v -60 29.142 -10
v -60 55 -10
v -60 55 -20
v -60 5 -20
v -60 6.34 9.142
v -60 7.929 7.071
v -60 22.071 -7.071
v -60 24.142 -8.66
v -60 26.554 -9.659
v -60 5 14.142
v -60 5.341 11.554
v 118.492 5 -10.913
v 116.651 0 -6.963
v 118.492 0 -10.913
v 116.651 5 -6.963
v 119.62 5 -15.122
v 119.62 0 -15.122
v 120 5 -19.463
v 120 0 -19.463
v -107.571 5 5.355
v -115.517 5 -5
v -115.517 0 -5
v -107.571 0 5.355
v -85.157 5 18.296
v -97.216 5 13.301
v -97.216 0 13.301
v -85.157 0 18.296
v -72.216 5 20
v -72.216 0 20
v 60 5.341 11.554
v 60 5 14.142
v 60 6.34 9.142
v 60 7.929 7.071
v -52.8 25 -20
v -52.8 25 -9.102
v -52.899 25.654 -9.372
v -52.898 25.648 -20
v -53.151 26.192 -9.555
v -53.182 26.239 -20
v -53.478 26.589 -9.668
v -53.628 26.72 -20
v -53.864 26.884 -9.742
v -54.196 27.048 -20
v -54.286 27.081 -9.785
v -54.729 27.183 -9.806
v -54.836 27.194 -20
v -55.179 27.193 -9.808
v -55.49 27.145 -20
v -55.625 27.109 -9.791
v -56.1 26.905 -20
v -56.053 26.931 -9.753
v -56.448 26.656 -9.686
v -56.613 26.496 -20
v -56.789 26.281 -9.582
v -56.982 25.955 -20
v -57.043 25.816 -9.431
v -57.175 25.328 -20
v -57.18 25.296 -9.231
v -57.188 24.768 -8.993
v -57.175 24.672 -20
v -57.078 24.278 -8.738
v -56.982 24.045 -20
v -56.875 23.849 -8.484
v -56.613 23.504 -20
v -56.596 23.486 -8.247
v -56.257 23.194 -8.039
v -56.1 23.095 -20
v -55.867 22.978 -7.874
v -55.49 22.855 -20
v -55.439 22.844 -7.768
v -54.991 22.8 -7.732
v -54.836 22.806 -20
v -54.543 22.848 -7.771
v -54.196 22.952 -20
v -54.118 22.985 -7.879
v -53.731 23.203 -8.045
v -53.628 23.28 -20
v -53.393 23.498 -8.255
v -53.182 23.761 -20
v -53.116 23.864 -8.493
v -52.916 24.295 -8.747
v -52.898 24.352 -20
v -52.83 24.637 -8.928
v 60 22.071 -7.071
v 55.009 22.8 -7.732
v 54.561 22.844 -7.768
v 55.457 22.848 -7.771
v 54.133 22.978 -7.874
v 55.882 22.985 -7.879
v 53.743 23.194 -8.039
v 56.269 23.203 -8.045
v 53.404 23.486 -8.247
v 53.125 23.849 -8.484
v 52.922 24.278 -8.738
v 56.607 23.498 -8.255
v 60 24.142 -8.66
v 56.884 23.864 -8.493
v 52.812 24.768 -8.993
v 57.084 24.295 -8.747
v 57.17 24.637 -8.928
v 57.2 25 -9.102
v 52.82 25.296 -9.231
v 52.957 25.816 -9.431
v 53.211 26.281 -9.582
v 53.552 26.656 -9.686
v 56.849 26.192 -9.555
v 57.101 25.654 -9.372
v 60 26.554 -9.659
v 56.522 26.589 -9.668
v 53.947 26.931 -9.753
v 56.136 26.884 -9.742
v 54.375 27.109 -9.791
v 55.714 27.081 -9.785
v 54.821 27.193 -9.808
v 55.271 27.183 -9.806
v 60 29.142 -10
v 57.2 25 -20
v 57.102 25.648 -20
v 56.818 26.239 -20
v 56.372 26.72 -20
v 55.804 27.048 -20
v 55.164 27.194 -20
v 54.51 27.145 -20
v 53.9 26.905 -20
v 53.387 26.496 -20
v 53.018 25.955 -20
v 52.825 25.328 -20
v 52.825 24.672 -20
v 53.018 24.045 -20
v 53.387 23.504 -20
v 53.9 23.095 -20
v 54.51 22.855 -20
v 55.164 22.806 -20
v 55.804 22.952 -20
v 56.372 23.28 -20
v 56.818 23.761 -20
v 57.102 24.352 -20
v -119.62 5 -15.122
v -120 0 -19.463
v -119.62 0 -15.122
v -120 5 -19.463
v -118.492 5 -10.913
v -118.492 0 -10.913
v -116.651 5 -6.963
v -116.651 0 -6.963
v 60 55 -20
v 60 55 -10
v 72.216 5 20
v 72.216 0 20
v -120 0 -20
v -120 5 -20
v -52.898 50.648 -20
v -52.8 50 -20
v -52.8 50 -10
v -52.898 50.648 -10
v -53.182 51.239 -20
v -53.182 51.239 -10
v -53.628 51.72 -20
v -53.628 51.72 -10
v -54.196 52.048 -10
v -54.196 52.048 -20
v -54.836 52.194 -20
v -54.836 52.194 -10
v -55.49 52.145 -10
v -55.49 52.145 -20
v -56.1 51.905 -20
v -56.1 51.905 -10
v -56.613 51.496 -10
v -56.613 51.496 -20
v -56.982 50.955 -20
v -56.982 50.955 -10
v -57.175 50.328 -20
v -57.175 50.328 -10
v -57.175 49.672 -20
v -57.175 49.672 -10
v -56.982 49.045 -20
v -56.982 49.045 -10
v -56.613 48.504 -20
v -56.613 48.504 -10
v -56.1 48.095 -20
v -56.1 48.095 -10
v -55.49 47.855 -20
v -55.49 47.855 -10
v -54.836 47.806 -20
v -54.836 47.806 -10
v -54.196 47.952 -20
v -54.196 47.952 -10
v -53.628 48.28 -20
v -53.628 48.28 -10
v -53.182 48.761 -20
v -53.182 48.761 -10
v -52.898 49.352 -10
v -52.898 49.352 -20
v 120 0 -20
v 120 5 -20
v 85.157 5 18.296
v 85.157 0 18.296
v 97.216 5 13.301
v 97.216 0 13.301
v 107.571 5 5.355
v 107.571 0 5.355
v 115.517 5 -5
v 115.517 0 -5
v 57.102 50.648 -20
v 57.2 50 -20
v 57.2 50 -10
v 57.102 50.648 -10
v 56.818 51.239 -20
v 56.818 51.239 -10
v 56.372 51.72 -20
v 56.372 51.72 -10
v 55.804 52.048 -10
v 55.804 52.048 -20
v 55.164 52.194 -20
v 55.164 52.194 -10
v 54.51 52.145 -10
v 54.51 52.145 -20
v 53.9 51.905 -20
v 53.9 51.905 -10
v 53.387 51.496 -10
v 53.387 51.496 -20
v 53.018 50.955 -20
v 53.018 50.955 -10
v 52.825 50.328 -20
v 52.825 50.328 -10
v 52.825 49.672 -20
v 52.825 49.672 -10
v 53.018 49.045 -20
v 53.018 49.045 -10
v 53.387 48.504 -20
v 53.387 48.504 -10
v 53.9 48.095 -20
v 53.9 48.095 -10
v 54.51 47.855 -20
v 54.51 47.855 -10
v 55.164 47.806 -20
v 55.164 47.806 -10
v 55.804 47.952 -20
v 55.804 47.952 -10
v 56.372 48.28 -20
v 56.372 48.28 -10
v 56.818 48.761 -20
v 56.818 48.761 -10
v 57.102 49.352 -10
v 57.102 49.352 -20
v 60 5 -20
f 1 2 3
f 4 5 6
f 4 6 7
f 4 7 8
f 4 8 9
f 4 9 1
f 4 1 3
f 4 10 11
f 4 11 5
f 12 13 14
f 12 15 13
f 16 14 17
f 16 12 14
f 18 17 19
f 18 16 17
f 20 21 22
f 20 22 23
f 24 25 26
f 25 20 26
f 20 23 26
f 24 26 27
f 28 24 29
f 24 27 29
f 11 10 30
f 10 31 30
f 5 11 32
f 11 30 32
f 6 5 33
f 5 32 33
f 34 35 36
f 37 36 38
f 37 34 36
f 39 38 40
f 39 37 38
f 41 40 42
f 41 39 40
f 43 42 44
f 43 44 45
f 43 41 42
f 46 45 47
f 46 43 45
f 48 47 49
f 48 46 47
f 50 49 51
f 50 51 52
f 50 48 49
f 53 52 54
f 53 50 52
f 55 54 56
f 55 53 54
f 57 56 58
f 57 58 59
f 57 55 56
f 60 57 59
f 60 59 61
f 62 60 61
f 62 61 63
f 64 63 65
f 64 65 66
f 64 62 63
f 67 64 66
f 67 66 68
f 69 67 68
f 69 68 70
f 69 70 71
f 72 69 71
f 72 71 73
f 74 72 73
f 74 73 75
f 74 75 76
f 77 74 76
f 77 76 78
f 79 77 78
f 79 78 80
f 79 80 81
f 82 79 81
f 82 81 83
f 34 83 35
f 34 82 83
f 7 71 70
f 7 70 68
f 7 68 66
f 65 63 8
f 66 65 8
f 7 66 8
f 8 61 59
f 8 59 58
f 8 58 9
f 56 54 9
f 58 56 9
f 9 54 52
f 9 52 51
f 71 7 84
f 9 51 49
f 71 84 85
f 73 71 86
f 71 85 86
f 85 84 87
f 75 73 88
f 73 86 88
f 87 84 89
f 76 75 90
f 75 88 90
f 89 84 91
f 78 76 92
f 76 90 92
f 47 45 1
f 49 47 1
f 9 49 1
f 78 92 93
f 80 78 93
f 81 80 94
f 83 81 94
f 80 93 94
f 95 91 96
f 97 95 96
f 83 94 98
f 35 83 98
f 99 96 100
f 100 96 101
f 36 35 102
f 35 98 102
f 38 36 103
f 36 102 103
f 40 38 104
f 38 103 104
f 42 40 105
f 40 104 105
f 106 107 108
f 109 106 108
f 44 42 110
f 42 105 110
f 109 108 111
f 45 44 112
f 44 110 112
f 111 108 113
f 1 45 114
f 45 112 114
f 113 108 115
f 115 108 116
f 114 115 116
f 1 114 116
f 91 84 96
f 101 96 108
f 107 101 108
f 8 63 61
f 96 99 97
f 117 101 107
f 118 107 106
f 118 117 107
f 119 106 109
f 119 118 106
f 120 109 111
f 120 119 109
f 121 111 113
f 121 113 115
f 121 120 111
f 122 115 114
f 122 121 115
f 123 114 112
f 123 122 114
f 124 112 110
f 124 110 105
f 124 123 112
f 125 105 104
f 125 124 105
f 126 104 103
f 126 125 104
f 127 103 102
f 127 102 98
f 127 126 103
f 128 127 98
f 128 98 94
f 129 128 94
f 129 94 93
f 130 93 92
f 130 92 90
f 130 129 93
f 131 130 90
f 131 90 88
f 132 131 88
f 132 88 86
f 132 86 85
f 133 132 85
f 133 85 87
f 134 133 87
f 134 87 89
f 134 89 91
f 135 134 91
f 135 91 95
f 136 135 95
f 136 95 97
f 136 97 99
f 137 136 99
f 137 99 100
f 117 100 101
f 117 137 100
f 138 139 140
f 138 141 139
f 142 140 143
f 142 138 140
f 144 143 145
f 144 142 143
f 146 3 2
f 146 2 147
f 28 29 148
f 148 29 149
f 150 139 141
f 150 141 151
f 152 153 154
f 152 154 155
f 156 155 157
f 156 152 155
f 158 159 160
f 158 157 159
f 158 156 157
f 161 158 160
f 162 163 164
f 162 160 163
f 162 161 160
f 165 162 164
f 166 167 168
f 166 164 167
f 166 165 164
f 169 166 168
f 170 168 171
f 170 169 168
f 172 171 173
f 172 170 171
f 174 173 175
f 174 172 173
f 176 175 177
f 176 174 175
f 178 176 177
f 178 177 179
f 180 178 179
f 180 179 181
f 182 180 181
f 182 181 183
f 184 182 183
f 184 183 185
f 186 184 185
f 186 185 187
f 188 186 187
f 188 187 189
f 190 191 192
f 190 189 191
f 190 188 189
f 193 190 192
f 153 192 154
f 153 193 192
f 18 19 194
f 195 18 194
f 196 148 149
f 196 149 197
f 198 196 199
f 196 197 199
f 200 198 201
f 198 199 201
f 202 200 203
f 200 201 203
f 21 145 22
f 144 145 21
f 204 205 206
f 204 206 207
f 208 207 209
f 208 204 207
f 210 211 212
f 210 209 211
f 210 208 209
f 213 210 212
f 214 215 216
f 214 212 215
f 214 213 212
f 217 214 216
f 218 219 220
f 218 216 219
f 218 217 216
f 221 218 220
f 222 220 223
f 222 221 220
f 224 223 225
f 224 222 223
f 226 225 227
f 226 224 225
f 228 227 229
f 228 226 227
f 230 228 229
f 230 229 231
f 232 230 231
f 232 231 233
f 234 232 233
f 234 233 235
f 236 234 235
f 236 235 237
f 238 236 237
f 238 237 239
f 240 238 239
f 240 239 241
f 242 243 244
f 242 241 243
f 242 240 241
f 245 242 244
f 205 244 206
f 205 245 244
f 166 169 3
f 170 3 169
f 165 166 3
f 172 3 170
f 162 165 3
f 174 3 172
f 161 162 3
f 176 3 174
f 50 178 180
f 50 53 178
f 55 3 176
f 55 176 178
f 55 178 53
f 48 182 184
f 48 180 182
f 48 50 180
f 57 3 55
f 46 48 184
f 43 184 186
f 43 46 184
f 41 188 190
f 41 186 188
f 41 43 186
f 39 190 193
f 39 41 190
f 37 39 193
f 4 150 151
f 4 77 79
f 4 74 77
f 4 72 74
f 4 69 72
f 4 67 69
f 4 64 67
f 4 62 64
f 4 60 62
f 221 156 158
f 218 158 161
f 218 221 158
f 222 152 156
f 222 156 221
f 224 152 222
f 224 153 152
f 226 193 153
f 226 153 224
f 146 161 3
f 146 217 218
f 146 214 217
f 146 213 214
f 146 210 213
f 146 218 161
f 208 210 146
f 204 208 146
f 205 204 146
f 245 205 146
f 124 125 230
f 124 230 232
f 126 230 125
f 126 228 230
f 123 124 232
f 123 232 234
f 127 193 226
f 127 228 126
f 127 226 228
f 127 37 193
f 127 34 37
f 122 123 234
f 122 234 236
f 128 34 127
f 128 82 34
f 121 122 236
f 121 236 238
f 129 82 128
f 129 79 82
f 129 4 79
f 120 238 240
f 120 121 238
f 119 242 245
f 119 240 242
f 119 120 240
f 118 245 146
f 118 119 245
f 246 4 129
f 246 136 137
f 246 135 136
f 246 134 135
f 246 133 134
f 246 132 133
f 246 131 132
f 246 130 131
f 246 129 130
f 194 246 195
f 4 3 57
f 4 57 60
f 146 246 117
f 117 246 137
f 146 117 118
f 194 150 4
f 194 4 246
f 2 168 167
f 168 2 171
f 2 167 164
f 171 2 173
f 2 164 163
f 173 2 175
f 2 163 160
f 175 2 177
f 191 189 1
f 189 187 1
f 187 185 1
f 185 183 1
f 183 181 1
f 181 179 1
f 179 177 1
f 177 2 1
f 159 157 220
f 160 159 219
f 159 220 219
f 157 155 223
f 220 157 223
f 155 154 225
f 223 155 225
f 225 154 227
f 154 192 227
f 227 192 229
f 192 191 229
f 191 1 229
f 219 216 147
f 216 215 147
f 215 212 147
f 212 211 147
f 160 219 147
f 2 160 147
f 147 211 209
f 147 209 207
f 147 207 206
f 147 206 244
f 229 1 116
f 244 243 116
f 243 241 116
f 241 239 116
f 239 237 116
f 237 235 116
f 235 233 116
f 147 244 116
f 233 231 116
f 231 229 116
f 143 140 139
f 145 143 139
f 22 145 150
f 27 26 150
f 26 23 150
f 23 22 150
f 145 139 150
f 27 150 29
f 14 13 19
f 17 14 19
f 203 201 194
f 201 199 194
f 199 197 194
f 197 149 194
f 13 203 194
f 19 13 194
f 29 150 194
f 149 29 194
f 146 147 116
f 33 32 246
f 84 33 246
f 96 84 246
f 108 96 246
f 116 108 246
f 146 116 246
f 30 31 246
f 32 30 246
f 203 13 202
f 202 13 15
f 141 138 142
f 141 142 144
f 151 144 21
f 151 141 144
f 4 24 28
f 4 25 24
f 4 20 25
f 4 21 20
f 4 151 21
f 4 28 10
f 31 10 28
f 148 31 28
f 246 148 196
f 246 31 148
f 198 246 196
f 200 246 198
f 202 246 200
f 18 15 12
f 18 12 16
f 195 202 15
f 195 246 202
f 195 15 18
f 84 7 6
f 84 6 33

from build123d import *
from OCP.BRepFilletAPI import BRepFilletAPI_MakeChamfer

# Parameters (mm, degrees)
SKETCH_1_W               = 240
SKETCH_1_H               = 40
EXTRUDE_1_DEPTH          = 5
SKETCH_2_W               = 120
SKETCH_2_H               = 10
EXTRUDE_2_DEPTH          = 50
CHAMFER_1_SIZE           = 20
FILLET_4_R               = 10
CUT_EXTRUDE_1_DEPTH      = 136.369863707
CUT_EXTRUDE_1_DEPTH_BACK = 136.369863707
SKETCH_4_R               = 2.2
CHAMFER_2_SIZE           = 25
CHAMFER_3_SIZE           = 15
CHAMFER_3_SIZE2          = 7.764571353
FILLET_6_R               = 25
FILLET_7_R               = 50
FILLET_8_R               = 50


with BuildPart() as part:
    # 草图1 → 凸台-拉伸1 (new body)
    with BuildSketch(Plane(origin=(0, 0, 0), x_dir=(1, 0, 0), z_dir=(0, 1, 0))):
        Rectangle(SKETCH_1_W, SKETCH_1_H)
    extrude(amount=EXTRUDE_1_DEPTH)

    # 草图2 → 凸台-拉伸2 (add)
    with BuildSketch(Plane(origin=(0, 5, 0), x_dir=(1, 0, 0), z_dir=(0, 1, 0))):
        with Locations((0, 15)):
            Rectangle(SKETCH_2_W, SKETCH_2_H)
    extrude(amount=EXTRUDE_2_DEPTH)

    # 倒角1
    chamfer_1_edges = [part.edges().sort_by_distance(p)[0] for p in [
        (0, 5, -10),
    ]]
    chamfer(chamfer_1_edges, length=CHAMFER_1_SIZE)

    # 圆角4
    fillet_4_edges = [part.edges().sort_by_distance(p)[0] for p in [
        (0, 25, -10),
        (0, 5, 10),
    ]]
    fillet(fillet_4_edges, radius=FILLET_4_R)

    # 草图4 → 切除-拉伸1 (cut, two sides: drawn at the far end of the back side and taken through both)
    with BuildSketch(Plane.XY.offset(-10).offset(-CUT_EXTRUDE_1_DEPTH_BACK)):
        with Locations((-55, 50)):
            Circle(SKETCH_4_R)
        with Locations((55, 50)):
            Circle(SKETCH_4_R)
        with Locations((-55, 25)):
            Circle(SKETCH_4_R)
        with Locations((55, 25)):
            Circle(SKETCH_4_R)
    extrude(amount=CUT_EXTRUDE_1_DEPTH + CUT_EXTRUDE_1_DEPTH_BACK, mode=Mode.SUBTRACT)

    # 倒角2
    chamfer_2_edges = [part.edges().sort_by_distance(p)[0] for p in [
        (120, 2.5, 20),
        (-120, 2.5, 20),
    ]]
    chamfer(chamfer_2_edges, length=CHAMFER_2_SIZE)

    # 倒角3: one chamfer whose edges measure the first distance from different faces: ONE call of the kernel's chamfer builder (chamfer() names one face for all edges)
    chamfer_3_edges_1 = [part.edges().sort_by_distance(p)[0] for p in [
        (120, 2.5, -5),
    ]]
    chamfer_3_side_1 = [part.faces().sort_by_distance(p)[0] for p in [
        (107.5, 2.5, 7.5),
    ]]
    chamfer_3_edges_2 = [part.edges().sort_by_distance(p)[0] for p in [
        (-120, 2.5, -5),
    ]]
    chamfer_3_side_2 = [part.faces().sort_by_distance(p)[0] for p in [
        (-107.5, 2.5, 7.5),
    ]]
    chamfer_3 = BRepFilletAPI_MakeChamfer(part.part.solid().wrapped)
    for e in chamfer_3_edges_1:
        chamfer_3.Add(CHAMFER_3_SIZE, CHAMFER_3_SIZE2, e.wrapped, chamfer_3_side_1[0].wrapped)  # the first distance lies on this face
    for e in chamfer_3_edges_2:
        chamfer_3.Add(CHAMFER_3_SIZE, CHAMFER_3_SIZE2, e.wrapped, chamfer_3_side_2[0].wrapped)  # the first distance lies on this face
    add(Compound.cast(chamfer_3.Shape()), mode=Mode.REPLACE)

    # 圆角6
    fillet_6_edges = [part.edges().sort_by_distance(p)[0] for p in [
        (-120, 2.5, -12.764571353),
        (120, 2.5, -12.764571353),
    ]]
    fillet(fillet_6_edges, radius=FILLET_6_R)

    # 圆角7
    # the kernel refuses this fillet: 50 mm, written as the material it takes off along each edge
    with BuildSketch(Plane(origin=(95, -51.772199057, 20), x_dir=(-1, 0, 0), z_dir=(0, 1, 0))) as fillet_7_piece_1:
        with BuildLine():
            CenterArc((20.708879623, -50), FILLET_7_R, 90, 44.591350674)
            Line((-14.393398282, -14.393398282), (-15.09544384, -13.681266248))
            Line((-15.09544384, -13.681266248), (-0.707106781, 0.707106781))
            Line((-0.707106781, 0.707106781), (0, 1))
            Line((0, 1), (20.708879623, 1))
            Line((20.708879623, 1), (20.708879623, 0))
        make_face()
    extrude(amount=108.544398113, mode=Mode.SUBTRACT)
    with BuildSketch(Plane(origin=(-95, -51.772199057, 20), x_dir=(-0.7071067811865476, 0, -0.7071067811865476), z_dir=(0, 1, 0))) as fillet_7_piece_2:
        with BuildLine():
            CenterArc((20.711949847, -49.998728271), FILLET_7_R, 90.408649326, 44.591350674)
            Line((-14.643389212, -14.643389212), (-15.350495993, -13.936282431))
            Line((-15.350495993, -13.936282431), (-0.707106781, 0.707106781))
            Line((-0.707106781, 0.707106781), (0, 1))
            Line((0, 1), (20.348206844, 0.999974565))
            Line((20.348206844, 0.999974565), (20.355339059, 0))
        make_face()
    extrude(amount=108.544398113, mode=Mode.SUBTRACT)

    # 圆角8
    # the kernel refuses this fillet: 50 mm, written as the material it takes off along each edge
    with BuildSketch(Plane(origin=(109.393398282, -99.666312896, 5.606601718), x_dir=(0.49999999999999956, 0, -0.8660254037844389), z_dir=(0, 1, 0))) as fillet_8_piece_1:
        with BuildLine():
            CenterArc((12.247448714, 50), FILLET_8_R, 210, 60)
            Line((-31.053821475, 25), (-35.383948494, 22.5))
            ThreePointArc((-35.383948494, 22.5), (-34.346314531, 20.702765255), (-1.328508268, -4.820276526))
            Line((-1.328508268, -4.820276526), (0, -5))
            Line((0, -5), (12.247448714, -5))
            Line((12.247448714, -5), (12.247448714, 0))
        make_face()
    extrude(amount=204.332625793, mode=Mode.SUBTRACT)
    with BuildSketch(Plane(origin=(-109.393398282, -99.666312896, 5.606601718), x_dir=(0.9325504463801257, 0, 0.3610396999724933), z_dir=(0, 1, 0))) as fillet_8_piece_2:
        with BuildLine():
            CenterArc((21.81454016, 46.627522319), FILLET_8_R, 231.16406129, 60)
            Line((-9.540086185, 7.680283562), (-12.675548819, 3.785559686))
            Line((-12.675548819, 3.785559686), (-3.135462634, -3.894723876))
            Line((-3.135462634, -3.894723876), (-1.987924813, -4.587826821))
            ThreePointArc((-1.987924813, -4.587826821), (39.736431626, -5.412006342), (41.671723658, -4.662752232))
            Line((41.671723658, -4.662752232), (39.866525159, 0))
        make_face()
    extrude(amount=204.332625793, mode=Mode.SUBTRACT)


solid = part.part
